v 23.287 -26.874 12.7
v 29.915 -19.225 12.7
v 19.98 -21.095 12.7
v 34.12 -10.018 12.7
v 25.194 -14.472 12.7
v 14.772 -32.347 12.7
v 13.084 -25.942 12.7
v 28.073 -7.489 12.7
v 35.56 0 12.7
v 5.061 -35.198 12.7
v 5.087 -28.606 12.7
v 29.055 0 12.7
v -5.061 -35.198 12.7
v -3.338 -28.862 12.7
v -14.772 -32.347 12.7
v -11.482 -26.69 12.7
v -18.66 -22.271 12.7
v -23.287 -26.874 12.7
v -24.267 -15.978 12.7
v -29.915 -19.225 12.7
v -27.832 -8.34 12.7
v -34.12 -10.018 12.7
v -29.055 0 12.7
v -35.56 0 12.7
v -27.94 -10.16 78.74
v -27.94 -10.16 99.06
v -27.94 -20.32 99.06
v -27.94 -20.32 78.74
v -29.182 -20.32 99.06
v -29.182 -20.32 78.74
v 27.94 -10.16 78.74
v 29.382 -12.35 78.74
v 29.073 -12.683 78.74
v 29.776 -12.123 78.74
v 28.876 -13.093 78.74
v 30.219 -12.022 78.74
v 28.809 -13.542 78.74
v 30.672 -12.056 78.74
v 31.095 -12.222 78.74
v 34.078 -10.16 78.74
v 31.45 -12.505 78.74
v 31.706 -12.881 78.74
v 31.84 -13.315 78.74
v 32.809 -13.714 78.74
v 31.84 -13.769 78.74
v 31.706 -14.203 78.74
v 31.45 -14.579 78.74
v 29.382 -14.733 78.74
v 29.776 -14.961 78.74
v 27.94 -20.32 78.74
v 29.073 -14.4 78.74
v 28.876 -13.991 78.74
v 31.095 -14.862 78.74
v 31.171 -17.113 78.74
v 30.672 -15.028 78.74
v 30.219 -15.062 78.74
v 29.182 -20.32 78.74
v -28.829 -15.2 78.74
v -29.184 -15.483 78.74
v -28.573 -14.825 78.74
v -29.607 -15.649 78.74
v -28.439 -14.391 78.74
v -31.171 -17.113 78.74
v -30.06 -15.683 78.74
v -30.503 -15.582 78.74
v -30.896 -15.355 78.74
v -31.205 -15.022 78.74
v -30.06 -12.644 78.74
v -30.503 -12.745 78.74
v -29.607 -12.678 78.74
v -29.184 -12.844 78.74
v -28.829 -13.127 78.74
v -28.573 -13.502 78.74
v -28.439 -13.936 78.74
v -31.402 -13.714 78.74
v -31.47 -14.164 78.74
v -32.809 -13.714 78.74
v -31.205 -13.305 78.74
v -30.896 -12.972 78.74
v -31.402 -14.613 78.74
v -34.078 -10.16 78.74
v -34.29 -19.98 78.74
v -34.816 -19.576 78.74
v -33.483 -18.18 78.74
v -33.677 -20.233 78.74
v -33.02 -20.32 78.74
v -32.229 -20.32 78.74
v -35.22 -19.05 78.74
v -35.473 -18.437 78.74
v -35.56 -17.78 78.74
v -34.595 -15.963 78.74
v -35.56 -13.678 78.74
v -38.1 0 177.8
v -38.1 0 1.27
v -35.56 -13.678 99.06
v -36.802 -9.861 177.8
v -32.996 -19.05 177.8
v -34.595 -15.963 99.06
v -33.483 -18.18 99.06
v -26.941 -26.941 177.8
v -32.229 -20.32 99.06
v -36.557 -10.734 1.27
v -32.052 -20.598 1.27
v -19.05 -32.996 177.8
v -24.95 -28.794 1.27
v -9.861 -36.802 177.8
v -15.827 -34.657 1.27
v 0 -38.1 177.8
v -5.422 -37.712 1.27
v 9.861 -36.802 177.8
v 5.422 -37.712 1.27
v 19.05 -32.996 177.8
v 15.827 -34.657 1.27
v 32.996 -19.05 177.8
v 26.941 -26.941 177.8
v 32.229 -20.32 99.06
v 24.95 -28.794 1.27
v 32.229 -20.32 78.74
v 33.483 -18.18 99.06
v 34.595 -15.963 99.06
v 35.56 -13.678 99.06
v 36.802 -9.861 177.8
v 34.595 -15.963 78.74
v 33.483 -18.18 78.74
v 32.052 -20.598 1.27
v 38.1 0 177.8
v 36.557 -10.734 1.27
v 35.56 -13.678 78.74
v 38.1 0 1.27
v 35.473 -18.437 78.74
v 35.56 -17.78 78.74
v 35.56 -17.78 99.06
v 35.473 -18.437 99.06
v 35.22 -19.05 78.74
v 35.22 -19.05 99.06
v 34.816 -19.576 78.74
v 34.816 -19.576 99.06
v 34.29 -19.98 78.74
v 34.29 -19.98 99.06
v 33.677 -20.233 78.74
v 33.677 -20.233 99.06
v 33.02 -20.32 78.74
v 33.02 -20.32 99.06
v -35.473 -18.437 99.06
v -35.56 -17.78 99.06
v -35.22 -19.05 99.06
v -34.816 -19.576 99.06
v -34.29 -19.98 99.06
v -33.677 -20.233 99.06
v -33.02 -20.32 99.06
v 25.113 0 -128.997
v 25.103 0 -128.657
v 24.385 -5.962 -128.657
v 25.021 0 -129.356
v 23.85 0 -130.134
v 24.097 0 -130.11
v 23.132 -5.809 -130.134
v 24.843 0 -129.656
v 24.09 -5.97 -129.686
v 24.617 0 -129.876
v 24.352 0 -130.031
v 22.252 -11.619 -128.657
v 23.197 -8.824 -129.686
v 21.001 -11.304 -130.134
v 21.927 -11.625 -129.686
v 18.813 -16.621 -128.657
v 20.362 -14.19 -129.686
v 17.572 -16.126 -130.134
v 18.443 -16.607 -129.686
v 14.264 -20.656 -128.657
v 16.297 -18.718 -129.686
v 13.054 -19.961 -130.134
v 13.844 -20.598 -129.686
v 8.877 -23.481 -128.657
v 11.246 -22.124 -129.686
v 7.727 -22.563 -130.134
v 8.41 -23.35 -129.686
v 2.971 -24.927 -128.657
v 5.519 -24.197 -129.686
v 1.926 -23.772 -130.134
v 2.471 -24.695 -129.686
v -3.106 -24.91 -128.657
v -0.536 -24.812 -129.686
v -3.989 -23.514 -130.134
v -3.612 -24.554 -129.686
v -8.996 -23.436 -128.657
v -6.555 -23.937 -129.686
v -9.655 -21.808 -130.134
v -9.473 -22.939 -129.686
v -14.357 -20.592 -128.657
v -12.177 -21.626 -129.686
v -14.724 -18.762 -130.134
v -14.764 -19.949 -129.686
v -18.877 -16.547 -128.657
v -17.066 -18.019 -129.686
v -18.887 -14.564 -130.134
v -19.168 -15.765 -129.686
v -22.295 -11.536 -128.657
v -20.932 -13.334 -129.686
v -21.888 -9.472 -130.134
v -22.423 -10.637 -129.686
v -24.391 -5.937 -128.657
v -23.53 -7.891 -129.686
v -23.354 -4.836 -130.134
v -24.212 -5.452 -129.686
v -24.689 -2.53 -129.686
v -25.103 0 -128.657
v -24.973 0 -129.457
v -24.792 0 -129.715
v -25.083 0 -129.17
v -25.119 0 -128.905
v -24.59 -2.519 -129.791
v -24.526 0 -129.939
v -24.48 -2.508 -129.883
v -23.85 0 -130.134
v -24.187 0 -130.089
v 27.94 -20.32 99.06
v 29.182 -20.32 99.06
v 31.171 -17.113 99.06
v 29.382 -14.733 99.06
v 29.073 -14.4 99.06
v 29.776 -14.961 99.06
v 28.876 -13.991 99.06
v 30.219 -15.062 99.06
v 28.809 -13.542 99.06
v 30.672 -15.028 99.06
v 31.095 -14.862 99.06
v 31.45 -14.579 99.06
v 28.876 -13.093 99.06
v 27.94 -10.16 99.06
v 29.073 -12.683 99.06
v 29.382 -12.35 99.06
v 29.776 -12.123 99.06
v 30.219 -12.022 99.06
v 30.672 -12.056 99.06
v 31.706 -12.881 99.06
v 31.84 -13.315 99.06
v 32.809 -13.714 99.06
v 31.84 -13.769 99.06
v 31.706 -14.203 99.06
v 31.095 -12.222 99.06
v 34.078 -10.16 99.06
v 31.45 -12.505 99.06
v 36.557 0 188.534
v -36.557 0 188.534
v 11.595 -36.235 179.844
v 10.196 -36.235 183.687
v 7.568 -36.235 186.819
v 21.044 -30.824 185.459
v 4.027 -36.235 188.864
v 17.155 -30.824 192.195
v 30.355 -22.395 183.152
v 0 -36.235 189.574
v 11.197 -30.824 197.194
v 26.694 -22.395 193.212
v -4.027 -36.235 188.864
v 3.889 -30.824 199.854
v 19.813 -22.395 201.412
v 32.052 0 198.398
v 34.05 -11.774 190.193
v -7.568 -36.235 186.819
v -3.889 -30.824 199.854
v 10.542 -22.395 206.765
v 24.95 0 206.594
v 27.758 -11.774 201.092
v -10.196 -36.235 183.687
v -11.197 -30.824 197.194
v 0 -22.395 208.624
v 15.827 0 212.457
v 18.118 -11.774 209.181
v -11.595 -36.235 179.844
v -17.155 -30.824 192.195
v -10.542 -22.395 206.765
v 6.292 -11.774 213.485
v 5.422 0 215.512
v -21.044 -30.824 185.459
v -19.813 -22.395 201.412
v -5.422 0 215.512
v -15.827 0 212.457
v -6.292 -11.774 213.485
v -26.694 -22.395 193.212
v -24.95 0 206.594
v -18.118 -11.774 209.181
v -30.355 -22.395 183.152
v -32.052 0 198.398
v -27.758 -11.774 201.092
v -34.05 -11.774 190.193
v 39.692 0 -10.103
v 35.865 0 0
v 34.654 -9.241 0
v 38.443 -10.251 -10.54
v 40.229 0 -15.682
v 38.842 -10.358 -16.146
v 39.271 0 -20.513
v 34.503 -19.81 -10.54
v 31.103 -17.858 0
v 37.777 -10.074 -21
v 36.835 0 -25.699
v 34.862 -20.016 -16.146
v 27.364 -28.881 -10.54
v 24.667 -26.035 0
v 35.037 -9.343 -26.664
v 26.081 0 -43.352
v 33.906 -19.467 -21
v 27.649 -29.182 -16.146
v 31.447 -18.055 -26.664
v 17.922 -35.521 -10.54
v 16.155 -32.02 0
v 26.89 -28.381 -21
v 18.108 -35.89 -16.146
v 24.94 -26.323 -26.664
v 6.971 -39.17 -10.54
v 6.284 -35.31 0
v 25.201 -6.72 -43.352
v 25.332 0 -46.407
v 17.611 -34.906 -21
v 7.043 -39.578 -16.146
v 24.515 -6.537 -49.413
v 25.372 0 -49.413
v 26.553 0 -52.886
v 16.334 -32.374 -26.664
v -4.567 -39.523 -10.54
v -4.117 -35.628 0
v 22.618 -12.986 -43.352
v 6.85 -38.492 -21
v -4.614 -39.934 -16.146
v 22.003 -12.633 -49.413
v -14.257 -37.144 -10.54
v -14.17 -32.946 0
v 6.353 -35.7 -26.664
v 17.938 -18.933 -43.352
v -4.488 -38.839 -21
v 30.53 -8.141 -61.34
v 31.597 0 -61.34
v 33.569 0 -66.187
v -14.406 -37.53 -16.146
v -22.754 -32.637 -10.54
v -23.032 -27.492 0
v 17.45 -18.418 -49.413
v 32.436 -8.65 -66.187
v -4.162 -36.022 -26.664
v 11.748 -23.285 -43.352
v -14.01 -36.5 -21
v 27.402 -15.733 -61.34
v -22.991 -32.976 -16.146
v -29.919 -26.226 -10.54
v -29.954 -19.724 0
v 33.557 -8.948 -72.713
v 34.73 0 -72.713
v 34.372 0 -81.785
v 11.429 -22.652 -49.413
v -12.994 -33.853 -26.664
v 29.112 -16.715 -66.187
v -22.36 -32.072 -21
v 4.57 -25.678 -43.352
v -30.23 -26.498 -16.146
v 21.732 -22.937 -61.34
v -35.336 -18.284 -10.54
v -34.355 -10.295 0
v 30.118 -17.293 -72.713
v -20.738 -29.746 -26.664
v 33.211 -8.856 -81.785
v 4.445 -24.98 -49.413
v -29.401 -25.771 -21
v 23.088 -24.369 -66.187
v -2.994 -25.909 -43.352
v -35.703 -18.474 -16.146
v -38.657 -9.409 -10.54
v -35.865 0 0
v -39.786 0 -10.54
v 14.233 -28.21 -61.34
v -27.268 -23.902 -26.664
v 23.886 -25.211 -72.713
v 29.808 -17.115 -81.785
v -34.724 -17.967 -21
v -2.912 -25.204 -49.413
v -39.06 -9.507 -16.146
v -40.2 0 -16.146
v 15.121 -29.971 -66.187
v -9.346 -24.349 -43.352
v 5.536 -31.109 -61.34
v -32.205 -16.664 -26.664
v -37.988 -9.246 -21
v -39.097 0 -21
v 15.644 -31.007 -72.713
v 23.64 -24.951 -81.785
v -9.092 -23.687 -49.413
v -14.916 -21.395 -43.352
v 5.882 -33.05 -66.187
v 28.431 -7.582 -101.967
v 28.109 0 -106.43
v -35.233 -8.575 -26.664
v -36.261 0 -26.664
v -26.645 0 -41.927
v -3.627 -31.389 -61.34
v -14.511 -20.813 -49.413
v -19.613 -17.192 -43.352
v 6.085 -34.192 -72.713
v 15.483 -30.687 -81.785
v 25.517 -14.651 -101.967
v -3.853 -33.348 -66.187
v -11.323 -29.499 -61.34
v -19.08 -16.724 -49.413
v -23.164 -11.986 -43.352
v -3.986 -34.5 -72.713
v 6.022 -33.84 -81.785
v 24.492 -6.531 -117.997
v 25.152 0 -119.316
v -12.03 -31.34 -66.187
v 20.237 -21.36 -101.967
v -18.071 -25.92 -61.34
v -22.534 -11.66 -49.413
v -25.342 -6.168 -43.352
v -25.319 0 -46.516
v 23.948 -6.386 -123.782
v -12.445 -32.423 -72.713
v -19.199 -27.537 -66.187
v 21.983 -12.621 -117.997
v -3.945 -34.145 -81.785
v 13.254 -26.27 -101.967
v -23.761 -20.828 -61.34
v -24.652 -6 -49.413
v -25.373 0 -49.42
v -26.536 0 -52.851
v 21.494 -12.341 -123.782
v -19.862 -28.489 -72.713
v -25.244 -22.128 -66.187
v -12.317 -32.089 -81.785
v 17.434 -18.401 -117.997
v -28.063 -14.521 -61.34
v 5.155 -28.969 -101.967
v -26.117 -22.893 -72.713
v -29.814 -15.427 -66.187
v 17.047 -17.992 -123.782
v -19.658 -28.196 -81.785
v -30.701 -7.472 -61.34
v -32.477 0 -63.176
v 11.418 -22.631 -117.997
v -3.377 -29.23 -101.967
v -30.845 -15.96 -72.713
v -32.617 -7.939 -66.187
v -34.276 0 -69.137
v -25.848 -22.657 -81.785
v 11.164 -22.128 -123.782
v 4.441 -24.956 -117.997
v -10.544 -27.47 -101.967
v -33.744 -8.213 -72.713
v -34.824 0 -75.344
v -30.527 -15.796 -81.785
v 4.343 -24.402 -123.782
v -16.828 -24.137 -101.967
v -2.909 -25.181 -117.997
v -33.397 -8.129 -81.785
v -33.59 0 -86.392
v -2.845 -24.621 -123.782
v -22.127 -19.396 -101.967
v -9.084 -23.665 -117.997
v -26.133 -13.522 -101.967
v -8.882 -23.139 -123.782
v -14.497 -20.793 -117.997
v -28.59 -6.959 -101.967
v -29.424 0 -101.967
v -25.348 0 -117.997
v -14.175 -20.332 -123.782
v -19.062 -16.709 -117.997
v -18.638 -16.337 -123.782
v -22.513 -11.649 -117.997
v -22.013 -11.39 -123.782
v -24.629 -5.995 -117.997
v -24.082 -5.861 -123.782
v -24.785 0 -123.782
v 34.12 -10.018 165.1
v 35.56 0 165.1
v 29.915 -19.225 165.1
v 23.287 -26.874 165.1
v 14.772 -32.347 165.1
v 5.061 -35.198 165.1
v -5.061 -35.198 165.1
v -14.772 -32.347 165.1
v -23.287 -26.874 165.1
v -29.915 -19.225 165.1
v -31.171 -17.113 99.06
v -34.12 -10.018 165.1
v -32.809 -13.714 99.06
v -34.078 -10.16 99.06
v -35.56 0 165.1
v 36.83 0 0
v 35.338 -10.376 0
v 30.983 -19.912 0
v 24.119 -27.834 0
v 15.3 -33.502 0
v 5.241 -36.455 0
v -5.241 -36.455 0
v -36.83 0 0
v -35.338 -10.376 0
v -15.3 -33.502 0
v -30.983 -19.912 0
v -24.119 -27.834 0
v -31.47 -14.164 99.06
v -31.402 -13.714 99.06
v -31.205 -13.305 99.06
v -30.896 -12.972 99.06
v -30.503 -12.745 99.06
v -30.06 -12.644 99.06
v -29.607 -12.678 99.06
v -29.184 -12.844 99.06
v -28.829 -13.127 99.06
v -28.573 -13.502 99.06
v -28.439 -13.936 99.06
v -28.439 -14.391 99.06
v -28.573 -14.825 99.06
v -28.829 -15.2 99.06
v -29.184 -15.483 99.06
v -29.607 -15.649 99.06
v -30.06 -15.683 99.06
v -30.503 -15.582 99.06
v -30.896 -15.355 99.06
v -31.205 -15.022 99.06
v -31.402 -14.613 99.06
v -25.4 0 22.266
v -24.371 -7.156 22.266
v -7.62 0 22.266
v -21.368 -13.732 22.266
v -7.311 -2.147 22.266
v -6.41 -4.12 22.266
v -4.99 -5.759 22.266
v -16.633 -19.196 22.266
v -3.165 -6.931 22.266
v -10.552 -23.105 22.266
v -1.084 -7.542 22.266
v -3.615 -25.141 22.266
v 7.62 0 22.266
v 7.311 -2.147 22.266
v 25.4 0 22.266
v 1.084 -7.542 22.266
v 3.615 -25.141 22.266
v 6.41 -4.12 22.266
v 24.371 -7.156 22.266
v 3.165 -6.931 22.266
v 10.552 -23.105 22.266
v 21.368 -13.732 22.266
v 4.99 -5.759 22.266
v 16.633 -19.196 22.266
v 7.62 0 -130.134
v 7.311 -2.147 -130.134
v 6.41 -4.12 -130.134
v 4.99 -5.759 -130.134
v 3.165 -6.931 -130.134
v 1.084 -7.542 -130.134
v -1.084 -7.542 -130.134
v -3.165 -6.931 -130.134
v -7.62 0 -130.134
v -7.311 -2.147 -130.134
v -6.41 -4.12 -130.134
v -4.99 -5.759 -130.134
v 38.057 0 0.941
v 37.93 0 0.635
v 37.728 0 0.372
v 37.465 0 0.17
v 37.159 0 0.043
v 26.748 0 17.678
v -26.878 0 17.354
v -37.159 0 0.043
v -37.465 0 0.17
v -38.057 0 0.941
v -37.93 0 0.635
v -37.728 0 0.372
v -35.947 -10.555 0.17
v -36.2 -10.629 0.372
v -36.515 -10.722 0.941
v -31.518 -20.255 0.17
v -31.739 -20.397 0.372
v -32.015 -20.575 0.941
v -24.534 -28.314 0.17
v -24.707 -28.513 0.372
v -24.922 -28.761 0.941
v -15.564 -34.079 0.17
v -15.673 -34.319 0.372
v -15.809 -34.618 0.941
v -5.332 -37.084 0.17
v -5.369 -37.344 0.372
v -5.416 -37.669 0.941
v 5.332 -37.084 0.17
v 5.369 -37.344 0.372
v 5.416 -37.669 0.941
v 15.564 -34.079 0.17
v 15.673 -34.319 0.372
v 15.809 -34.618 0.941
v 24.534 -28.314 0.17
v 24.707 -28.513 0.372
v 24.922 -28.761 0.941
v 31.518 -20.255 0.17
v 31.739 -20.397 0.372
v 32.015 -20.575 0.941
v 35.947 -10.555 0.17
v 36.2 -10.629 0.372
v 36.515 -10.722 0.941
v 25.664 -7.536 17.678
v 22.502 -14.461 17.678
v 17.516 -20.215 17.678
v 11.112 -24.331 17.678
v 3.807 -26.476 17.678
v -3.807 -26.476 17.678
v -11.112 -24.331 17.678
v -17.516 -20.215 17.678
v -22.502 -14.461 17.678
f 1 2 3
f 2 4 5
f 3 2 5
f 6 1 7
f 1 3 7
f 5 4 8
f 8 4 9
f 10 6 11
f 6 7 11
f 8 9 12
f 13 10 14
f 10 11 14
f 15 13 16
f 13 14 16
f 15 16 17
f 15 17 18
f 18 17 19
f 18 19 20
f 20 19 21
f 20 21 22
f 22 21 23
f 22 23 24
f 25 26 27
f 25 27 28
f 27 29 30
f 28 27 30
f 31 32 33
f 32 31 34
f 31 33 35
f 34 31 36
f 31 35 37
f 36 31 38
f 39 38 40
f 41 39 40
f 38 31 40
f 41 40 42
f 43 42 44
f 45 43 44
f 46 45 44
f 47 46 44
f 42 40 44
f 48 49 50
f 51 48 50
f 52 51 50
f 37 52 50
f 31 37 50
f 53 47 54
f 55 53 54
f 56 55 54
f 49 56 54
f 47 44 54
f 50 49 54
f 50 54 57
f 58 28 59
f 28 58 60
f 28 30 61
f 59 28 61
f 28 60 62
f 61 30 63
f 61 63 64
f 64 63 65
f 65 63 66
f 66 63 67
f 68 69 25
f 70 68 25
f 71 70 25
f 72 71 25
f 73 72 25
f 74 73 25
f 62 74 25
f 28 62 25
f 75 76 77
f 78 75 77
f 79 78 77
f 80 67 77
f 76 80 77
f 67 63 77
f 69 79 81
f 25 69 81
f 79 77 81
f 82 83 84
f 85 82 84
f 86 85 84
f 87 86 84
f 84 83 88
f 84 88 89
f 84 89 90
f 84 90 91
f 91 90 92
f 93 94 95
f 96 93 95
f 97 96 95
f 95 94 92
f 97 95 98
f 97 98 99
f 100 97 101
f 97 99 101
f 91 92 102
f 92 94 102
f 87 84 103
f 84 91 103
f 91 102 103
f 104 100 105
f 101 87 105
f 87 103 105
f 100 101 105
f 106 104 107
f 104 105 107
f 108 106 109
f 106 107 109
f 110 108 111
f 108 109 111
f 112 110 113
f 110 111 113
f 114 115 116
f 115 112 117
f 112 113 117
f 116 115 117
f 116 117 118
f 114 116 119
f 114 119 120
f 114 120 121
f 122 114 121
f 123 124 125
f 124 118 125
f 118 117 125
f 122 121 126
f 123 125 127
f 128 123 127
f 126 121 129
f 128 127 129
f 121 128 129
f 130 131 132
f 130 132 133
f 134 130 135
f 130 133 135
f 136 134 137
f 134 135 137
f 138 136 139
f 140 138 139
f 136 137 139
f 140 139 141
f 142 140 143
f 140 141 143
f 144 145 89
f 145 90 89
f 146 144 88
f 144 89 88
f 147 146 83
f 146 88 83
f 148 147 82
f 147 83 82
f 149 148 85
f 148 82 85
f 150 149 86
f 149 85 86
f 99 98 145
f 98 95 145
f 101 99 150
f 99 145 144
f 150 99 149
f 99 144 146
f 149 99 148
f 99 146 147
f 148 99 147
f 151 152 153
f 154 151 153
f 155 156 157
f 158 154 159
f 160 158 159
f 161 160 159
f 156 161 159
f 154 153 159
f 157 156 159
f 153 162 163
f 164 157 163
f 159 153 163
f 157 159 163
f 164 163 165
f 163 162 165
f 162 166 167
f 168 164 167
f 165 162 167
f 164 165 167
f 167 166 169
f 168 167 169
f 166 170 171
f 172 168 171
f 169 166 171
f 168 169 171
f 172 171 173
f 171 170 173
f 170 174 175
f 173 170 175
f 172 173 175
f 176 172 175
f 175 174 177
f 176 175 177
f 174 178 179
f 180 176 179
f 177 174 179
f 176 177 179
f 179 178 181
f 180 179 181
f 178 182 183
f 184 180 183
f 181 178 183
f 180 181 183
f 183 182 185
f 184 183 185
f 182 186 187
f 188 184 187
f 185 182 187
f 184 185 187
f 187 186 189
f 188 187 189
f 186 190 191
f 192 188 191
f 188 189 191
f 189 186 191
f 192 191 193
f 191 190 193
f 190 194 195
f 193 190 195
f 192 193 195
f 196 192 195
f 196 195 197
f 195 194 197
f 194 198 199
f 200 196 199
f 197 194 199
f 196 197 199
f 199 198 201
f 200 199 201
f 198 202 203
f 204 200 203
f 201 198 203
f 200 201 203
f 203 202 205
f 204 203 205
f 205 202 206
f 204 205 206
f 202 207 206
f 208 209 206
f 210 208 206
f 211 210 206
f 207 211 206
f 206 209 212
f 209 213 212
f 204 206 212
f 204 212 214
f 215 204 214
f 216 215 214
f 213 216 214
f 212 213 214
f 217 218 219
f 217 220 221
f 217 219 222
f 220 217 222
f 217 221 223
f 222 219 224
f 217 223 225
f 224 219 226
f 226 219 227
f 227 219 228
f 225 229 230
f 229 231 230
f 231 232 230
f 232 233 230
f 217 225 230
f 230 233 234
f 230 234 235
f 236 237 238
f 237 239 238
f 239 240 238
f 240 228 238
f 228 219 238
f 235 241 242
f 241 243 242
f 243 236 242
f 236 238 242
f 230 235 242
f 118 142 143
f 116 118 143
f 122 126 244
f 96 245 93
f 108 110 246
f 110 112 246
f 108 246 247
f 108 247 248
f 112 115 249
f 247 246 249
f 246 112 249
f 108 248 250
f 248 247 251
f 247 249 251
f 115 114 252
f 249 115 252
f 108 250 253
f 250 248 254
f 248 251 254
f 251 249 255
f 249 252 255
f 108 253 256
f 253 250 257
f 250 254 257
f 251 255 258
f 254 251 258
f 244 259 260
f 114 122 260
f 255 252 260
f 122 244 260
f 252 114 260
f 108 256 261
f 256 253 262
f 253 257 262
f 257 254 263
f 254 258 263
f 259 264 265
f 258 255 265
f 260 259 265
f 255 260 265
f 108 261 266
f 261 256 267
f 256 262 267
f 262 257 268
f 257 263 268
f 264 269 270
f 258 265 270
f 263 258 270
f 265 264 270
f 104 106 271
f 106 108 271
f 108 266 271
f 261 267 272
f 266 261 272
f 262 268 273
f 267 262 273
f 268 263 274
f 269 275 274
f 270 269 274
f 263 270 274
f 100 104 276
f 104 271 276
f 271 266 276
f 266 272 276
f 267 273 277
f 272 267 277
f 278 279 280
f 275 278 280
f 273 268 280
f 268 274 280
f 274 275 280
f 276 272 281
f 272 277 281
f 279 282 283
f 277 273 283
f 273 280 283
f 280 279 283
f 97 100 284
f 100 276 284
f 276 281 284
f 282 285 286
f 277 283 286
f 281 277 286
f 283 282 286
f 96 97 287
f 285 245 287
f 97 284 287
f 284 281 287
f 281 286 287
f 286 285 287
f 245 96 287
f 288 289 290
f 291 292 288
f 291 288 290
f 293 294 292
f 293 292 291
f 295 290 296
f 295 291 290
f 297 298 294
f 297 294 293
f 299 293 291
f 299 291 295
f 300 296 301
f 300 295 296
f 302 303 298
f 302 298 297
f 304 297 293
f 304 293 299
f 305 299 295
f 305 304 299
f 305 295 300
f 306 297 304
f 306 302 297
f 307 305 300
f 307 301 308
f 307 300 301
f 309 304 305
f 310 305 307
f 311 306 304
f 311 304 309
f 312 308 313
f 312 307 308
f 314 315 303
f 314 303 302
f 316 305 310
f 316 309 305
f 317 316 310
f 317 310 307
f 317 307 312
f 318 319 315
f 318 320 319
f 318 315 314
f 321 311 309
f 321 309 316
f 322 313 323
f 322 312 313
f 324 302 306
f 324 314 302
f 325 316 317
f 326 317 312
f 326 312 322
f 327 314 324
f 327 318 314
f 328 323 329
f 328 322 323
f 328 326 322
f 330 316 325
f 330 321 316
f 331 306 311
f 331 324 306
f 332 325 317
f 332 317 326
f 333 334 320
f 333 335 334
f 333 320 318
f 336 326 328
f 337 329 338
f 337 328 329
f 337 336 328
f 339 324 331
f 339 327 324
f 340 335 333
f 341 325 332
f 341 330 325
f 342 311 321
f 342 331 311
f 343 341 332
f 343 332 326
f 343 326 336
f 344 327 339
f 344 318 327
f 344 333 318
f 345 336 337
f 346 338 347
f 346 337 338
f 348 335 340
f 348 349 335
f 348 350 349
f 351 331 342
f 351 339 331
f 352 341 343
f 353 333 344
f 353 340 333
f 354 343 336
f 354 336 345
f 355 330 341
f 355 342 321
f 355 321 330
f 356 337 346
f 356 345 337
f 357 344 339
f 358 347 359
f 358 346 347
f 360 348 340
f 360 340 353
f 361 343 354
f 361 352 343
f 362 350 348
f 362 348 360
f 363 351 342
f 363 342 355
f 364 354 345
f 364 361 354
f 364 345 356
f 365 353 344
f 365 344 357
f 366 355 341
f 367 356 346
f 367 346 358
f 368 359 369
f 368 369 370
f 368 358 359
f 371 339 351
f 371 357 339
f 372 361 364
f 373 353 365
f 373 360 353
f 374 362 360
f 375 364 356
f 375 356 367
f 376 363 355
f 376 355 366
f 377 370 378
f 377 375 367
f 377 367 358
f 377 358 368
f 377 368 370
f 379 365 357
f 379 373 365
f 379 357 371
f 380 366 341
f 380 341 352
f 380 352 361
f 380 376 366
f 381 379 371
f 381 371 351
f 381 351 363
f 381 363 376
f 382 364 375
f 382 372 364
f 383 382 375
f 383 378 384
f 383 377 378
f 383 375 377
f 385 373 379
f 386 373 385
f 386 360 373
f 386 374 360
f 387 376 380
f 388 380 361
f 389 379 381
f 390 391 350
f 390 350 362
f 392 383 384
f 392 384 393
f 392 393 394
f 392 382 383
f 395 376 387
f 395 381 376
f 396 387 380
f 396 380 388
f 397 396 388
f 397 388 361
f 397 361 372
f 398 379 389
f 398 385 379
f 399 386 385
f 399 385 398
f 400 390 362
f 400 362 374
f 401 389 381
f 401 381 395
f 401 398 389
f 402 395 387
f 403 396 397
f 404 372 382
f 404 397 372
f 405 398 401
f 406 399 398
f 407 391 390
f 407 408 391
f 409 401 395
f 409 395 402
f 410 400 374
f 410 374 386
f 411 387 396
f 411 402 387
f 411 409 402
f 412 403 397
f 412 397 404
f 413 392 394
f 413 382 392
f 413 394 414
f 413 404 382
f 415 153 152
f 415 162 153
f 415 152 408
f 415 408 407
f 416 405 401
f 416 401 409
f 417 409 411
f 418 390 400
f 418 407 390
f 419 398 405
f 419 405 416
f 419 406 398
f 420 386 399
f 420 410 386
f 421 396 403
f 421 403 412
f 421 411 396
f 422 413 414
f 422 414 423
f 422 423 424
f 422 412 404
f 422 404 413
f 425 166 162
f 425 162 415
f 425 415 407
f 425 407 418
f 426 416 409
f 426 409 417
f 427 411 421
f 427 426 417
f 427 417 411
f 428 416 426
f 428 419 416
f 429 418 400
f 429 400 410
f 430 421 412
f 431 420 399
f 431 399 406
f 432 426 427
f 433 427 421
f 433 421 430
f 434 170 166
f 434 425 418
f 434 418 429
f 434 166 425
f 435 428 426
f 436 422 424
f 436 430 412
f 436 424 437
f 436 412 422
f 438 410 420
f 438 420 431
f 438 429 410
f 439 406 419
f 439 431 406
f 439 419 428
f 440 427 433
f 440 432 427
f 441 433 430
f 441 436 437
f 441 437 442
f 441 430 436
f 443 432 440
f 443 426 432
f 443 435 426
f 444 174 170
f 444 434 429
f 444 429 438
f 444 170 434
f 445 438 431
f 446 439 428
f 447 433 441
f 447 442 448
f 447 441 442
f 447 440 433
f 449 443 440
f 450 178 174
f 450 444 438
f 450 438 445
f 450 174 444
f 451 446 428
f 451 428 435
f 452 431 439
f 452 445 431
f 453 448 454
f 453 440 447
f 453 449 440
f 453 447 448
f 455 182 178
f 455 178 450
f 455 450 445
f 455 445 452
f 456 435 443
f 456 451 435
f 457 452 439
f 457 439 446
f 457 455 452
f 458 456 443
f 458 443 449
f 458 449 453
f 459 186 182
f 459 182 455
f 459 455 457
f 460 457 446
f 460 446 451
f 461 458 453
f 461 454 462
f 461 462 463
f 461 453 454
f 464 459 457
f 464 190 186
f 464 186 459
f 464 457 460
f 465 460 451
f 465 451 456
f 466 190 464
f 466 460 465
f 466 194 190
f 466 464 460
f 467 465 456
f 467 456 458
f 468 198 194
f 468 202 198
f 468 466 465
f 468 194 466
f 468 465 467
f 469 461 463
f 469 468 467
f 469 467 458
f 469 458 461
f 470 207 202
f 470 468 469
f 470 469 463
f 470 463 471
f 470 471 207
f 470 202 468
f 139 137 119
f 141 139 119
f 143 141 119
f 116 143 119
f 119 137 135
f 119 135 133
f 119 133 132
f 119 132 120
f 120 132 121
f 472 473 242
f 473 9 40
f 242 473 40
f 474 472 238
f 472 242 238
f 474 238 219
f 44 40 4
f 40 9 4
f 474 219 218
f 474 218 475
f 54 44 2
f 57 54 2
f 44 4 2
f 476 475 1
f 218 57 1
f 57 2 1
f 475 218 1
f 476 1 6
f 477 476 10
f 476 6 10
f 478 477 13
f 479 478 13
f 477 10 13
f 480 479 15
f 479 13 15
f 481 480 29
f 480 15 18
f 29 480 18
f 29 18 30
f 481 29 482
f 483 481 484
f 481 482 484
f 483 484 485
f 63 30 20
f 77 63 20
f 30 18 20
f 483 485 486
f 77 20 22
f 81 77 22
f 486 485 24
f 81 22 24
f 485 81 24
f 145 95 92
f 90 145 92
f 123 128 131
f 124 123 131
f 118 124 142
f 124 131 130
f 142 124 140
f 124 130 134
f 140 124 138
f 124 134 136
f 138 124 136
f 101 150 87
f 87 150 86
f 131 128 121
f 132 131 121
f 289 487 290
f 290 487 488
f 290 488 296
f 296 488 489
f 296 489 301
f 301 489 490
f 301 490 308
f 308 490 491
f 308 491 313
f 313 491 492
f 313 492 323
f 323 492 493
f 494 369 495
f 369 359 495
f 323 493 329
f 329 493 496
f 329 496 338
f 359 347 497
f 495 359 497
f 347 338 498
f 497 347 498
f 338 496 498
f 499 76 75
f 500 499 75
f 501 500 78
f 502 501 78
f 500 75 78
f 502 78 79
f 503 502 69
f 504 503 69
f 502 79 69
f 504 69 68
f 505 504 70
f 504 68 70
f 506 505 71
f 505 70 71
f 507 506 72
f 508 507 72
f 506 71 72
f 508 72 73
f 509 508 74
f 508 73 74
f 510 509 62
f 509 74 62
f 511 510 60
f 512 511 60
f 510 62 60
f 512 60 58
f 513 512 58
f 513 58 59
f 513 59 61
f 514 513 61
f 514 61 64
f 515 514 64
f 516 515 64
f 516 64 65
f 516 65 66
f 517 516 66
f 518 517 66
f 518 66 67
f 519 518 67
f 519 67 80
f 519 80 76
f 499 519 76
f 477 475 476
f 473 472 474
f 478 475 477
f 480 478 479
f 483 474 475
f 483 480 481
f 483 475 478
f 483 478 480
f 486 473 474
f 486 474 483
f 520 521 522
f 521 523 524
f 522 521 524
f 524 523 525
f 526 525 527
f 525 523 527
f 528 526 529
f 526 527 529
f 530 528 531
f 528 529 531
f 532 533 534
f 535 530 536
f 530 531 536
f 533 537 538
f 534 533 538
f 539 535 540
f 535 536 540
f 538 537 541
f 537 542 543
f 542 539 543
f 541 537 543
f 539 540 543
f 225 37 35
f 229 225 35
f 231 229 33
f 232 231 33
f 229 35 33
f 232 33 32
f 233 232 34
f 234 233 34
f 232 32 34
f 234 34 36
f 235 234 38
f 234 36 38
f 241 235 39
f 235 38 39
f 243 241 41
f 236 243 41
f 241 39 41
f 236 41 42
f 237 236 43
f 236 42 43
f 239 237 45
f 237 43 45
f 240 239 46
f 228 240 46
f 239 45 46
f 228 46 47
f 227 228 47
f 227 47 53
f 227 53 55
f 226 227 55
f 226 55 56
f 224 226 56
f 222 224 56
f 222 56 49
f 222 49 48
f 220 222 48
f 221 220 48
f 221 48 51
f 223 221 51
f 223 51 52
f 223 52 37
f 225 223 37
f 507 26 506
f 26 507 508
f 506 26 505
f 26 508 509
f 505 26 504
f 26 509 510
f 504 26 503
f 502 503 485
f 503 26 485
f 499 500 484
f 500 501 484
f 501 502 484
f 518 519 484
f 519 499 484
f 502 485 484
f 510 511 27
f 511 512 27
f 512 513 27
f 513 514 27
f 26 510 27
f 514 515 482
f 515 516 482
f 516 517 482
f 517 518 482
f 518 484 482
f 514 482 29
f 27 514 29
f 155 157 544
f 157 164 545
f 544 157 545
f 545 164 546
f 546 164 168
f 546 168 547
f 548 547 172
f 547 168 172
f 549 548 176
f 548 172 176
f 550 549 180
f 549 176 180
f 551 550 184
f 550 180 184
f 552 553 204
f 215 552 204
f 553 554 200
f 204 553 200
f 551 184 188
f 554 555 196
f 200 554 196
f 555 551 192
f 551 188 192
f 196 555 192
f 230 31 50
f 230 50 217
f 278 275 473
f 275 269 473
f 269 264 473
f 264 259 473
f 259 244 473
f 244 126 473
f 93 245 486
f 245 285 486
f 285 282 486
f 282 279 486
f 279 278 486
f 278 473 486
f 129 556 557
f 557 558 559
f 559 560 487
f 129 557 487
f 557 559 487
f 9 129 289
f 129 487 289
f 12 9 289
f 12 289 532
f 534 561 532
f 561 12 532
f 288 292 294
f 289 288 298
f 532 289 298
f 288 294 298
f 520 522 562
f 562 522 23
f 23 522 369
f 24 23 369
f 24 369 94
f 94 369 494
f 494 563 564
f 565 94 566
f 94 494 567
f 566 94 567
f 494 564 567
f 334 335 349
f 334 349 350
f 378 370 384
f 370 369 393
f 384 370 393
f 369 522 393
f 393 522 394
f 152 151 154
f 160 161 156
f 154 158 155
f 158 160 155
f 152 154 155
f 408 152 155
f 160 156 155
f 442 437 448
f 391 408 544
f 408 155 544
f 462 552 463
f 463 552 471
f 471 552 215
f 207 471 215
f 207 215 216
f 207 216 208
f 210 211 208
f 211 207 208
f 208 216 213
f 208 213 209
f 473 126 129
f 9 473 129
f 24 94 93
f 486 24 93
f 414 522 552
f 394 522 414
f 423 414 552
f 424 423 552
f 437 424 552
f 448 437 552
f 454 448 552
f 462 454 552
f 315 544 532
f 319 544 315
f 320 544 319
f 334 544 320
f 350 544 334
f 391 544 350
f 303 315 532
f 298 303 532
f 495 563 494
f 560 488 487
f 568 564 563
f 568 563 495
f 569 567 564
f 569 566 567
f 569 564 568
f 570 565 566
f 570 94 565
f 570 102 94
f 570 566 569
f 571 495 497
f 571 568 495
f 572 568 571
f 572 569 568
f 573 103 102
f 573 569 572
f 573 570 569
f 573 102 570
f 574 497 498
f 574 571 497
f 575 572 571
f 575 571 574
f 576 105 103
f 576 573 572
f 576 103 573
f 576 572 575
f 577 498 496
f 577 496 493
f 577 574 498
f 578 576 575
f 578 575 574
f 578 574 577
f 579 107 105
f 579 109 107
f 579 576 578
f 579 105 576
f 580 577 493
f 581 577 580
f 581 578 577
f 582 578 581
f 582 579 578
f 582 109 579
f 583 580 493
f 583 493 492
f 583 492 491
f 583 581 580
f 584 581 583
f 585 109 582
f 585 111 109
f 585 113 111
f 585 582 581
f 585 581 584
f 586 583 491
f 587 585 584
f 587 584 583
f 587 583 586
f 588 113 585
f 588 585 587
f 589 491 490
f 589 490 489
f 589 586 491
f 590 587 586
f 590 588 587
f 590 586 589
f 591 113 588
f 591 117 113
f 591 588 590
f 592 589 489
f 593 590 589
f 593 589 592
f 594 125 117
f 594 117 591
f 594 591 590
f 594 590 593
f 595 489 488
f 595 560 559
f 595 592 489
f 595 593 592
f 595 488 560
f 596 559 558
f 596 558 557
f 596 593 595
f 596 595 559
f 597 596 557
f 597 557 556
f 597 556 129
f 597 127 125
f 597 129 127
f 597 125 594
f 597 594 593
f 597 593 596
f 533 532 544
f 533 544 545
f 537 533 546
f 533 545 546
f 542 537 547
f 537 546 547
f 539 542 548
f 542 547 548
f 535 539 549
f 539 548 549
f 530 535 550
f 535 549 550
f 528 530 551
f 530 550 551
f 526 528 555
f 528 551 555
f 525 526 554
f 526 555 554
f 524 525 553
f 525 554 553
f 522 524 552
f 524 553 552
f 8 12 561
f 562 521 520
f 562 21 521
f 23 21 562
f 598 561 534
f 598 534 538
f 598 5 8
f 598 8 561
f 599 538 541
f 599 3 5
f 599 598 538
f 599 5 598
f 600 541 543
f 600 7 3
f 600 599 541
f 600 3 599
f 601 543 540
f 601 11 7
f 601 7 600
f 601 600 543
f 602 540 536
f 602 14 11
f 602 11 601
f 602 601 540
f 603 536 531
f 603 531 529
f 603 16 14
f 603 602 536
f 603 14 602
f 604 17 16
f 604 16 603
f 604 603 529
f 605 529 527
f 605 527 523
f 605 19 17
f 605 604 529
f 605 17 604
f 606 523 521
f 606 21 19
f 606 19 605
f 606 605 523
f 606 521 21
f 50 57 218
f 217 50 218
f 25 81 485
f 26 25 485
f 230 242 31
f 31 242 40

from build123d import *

# Parameters (mm, degrees)
SKETCH1_R           = 38.1
BOSS_EXTRUDE1_DEPTH = 177.80000000000007
SKETCH3_R           = 35.559999999999995
CUT_EXTRUDE1_DEPTH  = 152.4
FILLET2_R           = 1.27
FILLET3_R           = 1.27
SKETCH9_R           = 7.62
CUT_EXTRUDE2_DEPTH  = 165.1
SKETCH8_W           = 162.58314194957535
SKETCH8_H           = 382.9318112434521
CUT_EXTRUDE3_DEPTH  = 76.2
BOSS_EXTRUDE2_DEPTH = 7.619999999999988
SKETCH14_R          = 1.5239999999999987
CUT_EXTRUDE4_DEPTH  = 22.859999999999992
FILLET5_R           = 2.539999999999999
BOSS_EXTRUDE3_DEPTH = 7.619999999999988
FILLET6_R           = 2.539999999999999
SKETCH16_R          = 1.524000000000002
CUT_EXTRUDE5_DEPTH  = 22.859999999999992


with BuildPart() as part:
    # Sketch1 → Boss-Extrude1 (new body)
    with BuildSketch(Plane.XY):
        with Locations(Location((0, 0, 0), (0, 0, 180))):
            Circle(SKETCH1_R)
    extrude(amount=BOSS_EXTRUDE1_DEPTH)

    # Sketch2 → Revolve1 (revolve)
    with BuildSketch(Plane.XY.offset(177.80000000000007)):
        with BuildLine():
            Line((0, 38.1), (0, -38.1))
            ThreePointArc((0, -38.1), (-38.1, 4.67e-15), (0, 38.1))
        make_face()
    revolve(axis=Axis((0, 38.1, 177.80000000000007), (0, -1, 0)))

    # Sketch3 → Cut-Extrude1 (cut)
    with BuildSketch(Plane(origin=(0, 0, 12.7), x_dir=(-1, 0, 0), z_dir=(0, 0, -1))):
        Circle(SKETCH3_R)
    extrude(amount=-CUT_EXTRUDE1_DEPTH, mode=Mode.SUBTRACT)

    # Sketch6 → Revolve2 (revolve)
    with BuildSketch(Plane(origin=(0, 0, 0), x_dir=(-1, 0, 0), z_dir=(0, -1, 0))):
        with BuildLine():
            Line((0, -22.265951698074105), (0, 130.1340483019259))
            Line((0, 130.1340483019259), (-25.4, 130.1340483019259))
            add(Edge.make_bspline(
                [(-25.4, -22.265951698074105), (-27.209474215272646, -11.435886390625324), (-47.26531015507889, 9.698536893320565), (-32.8781656152221, 32.20916869017141), (-21.12597121495262, 47.868344338725585), (-46.9742504639721, 77.09905148430619), (-20.88415964856982, 111.24461293700098), (-25.4, 130.1340483019259)],
                knots=[0, 0, 0, 0, 0.261326759387534, 0.3596065034464086, 0.4835247043674423, 0.5659559263177129, 1, 1, 1, 1], degree=3))
            Line((-25.4, -22.265951698074105), (0, -22.265951698074105))
        make_face()
    revolve(axis=Axis((0, 0, 22.265951698074105), (0, 0, -1)))

    # Fillet2
    fillet2_edges = [part.edges().sort_by_distance(p)[0] for p in [
        (38.1, -9.33e-15, 0),
    ]]
    fillet(fillet2_edges, radius=FILLET2_R)

    # Fillet3
    fillet3_edges = [part.edges().sort_by_distance(p)[0] for p in [
        (-25.4, -3.11e-15, -130.1340483019259),
    ]]
    fillet(fillet3_edges, radius=FILLET3_R)

    # Sketch9 → Cut-Extrude2 (cut)
    with BuildSketch(Plane(origin=(0, 0, -130.1340483019259), x_dir=(-1, 0, 0), z_dir=(0, 0, -1))):
        Circle(SKETCH9_R)
    extrude(amount=-CUT_EXTRUDE2_DEPTH, mode=Mode.SUBTRACT)

    # Sketch8 → Cut-Extrude3 (cut)
    with BuildSketch(Plane(origin=(0, 0, 0), x_dir=(-1, 0, 0), z_dir=(0, -1, 0))):
        with Locations((4.054997145320982, -34.07619336508105)):
            Rectangle(SKETCH8_W, SKETCH8_H)
    extrude(amount=-CUT_EXTRUDE3_DEPTH, mode=Mode.SUBTRACT)

    # Sketch13 → Boss-Extrude2 (add)
    with BuildSketch(Plane(origin=(-35.559999999999995, 0, 0), x_dir=(0, 0, -1), z_dir=(1, 0, 0))):
        Polygon((-88.89999999999999, -10.159999999999995), (-99.06, -10.159999999999997), (-99.06, -20.319999999999997), (-78.74, -20.319999999999997), (-78.74, -10.159999999999995), align=None)
    extrude(amount=BOSS_EXTRUDE2_DEPTH)

    # Sketch14 → Cut-Extrude4 (cut)
    with BuildSketch(Plane(origin=(0, 0, 78.74), x_dir=(-1, 0, 0), z_dir=(0, 0, -1))):
        with Locations((29.94604004289414, -14.16356154450682)):
            Circle(SKETCH14_R)
    extrude(amount=-CUT_EXTRUDE4_DEPTH, mode=Mode.SUBTRACT)

    # Fillet5
    fillet5_edges = [part.edges().sort_by_distance(p)[0] for p in [
        (-35.559999999999995, -20.319999999999997, 88.9),
    ]]
    fillet(fillet5_edges, radius=FILLET5_R)

    # Sketch15 → Boss-Extrude3 (add)
    with BuildSketch(Plane.ZY.offset(-35.55999999999999)):
        Polygon((88.89999999999999, -10.159999999999995), (78.74, -10.159999999999997), (78.74, -20.319999999999997), (99.06, -20.319999999999997), (99.06, -10.159999999999995), align=None)
    extrude(amount=BOSS_EXTRUDE3_DEPTH)

    # Fillet6
    fillet6_edges = [part.edges().sort_by_distance(p)[0] for p in [
        (35.55999999999999, -20.319999999999997, 88.9),
    ]]
    fillet(fillet6_edges, radius=FILLET6_R)

    # Sketch16 → Cut-Extrude5 (cut)
    with BuildSketch(Plane(origin=(0, 0, 78.74), x_dir=(-1, 0, 0), z_dir=(0, 0, -1))):
        with Locations((-30.332583398218205, -13.54198617207203)):
            Circle(SKETCH16_R)
    extrude(amount=-CUT_EXTRUDE5_DEPTH, mode=Mode.SUBTRACT)


solid = part.part
